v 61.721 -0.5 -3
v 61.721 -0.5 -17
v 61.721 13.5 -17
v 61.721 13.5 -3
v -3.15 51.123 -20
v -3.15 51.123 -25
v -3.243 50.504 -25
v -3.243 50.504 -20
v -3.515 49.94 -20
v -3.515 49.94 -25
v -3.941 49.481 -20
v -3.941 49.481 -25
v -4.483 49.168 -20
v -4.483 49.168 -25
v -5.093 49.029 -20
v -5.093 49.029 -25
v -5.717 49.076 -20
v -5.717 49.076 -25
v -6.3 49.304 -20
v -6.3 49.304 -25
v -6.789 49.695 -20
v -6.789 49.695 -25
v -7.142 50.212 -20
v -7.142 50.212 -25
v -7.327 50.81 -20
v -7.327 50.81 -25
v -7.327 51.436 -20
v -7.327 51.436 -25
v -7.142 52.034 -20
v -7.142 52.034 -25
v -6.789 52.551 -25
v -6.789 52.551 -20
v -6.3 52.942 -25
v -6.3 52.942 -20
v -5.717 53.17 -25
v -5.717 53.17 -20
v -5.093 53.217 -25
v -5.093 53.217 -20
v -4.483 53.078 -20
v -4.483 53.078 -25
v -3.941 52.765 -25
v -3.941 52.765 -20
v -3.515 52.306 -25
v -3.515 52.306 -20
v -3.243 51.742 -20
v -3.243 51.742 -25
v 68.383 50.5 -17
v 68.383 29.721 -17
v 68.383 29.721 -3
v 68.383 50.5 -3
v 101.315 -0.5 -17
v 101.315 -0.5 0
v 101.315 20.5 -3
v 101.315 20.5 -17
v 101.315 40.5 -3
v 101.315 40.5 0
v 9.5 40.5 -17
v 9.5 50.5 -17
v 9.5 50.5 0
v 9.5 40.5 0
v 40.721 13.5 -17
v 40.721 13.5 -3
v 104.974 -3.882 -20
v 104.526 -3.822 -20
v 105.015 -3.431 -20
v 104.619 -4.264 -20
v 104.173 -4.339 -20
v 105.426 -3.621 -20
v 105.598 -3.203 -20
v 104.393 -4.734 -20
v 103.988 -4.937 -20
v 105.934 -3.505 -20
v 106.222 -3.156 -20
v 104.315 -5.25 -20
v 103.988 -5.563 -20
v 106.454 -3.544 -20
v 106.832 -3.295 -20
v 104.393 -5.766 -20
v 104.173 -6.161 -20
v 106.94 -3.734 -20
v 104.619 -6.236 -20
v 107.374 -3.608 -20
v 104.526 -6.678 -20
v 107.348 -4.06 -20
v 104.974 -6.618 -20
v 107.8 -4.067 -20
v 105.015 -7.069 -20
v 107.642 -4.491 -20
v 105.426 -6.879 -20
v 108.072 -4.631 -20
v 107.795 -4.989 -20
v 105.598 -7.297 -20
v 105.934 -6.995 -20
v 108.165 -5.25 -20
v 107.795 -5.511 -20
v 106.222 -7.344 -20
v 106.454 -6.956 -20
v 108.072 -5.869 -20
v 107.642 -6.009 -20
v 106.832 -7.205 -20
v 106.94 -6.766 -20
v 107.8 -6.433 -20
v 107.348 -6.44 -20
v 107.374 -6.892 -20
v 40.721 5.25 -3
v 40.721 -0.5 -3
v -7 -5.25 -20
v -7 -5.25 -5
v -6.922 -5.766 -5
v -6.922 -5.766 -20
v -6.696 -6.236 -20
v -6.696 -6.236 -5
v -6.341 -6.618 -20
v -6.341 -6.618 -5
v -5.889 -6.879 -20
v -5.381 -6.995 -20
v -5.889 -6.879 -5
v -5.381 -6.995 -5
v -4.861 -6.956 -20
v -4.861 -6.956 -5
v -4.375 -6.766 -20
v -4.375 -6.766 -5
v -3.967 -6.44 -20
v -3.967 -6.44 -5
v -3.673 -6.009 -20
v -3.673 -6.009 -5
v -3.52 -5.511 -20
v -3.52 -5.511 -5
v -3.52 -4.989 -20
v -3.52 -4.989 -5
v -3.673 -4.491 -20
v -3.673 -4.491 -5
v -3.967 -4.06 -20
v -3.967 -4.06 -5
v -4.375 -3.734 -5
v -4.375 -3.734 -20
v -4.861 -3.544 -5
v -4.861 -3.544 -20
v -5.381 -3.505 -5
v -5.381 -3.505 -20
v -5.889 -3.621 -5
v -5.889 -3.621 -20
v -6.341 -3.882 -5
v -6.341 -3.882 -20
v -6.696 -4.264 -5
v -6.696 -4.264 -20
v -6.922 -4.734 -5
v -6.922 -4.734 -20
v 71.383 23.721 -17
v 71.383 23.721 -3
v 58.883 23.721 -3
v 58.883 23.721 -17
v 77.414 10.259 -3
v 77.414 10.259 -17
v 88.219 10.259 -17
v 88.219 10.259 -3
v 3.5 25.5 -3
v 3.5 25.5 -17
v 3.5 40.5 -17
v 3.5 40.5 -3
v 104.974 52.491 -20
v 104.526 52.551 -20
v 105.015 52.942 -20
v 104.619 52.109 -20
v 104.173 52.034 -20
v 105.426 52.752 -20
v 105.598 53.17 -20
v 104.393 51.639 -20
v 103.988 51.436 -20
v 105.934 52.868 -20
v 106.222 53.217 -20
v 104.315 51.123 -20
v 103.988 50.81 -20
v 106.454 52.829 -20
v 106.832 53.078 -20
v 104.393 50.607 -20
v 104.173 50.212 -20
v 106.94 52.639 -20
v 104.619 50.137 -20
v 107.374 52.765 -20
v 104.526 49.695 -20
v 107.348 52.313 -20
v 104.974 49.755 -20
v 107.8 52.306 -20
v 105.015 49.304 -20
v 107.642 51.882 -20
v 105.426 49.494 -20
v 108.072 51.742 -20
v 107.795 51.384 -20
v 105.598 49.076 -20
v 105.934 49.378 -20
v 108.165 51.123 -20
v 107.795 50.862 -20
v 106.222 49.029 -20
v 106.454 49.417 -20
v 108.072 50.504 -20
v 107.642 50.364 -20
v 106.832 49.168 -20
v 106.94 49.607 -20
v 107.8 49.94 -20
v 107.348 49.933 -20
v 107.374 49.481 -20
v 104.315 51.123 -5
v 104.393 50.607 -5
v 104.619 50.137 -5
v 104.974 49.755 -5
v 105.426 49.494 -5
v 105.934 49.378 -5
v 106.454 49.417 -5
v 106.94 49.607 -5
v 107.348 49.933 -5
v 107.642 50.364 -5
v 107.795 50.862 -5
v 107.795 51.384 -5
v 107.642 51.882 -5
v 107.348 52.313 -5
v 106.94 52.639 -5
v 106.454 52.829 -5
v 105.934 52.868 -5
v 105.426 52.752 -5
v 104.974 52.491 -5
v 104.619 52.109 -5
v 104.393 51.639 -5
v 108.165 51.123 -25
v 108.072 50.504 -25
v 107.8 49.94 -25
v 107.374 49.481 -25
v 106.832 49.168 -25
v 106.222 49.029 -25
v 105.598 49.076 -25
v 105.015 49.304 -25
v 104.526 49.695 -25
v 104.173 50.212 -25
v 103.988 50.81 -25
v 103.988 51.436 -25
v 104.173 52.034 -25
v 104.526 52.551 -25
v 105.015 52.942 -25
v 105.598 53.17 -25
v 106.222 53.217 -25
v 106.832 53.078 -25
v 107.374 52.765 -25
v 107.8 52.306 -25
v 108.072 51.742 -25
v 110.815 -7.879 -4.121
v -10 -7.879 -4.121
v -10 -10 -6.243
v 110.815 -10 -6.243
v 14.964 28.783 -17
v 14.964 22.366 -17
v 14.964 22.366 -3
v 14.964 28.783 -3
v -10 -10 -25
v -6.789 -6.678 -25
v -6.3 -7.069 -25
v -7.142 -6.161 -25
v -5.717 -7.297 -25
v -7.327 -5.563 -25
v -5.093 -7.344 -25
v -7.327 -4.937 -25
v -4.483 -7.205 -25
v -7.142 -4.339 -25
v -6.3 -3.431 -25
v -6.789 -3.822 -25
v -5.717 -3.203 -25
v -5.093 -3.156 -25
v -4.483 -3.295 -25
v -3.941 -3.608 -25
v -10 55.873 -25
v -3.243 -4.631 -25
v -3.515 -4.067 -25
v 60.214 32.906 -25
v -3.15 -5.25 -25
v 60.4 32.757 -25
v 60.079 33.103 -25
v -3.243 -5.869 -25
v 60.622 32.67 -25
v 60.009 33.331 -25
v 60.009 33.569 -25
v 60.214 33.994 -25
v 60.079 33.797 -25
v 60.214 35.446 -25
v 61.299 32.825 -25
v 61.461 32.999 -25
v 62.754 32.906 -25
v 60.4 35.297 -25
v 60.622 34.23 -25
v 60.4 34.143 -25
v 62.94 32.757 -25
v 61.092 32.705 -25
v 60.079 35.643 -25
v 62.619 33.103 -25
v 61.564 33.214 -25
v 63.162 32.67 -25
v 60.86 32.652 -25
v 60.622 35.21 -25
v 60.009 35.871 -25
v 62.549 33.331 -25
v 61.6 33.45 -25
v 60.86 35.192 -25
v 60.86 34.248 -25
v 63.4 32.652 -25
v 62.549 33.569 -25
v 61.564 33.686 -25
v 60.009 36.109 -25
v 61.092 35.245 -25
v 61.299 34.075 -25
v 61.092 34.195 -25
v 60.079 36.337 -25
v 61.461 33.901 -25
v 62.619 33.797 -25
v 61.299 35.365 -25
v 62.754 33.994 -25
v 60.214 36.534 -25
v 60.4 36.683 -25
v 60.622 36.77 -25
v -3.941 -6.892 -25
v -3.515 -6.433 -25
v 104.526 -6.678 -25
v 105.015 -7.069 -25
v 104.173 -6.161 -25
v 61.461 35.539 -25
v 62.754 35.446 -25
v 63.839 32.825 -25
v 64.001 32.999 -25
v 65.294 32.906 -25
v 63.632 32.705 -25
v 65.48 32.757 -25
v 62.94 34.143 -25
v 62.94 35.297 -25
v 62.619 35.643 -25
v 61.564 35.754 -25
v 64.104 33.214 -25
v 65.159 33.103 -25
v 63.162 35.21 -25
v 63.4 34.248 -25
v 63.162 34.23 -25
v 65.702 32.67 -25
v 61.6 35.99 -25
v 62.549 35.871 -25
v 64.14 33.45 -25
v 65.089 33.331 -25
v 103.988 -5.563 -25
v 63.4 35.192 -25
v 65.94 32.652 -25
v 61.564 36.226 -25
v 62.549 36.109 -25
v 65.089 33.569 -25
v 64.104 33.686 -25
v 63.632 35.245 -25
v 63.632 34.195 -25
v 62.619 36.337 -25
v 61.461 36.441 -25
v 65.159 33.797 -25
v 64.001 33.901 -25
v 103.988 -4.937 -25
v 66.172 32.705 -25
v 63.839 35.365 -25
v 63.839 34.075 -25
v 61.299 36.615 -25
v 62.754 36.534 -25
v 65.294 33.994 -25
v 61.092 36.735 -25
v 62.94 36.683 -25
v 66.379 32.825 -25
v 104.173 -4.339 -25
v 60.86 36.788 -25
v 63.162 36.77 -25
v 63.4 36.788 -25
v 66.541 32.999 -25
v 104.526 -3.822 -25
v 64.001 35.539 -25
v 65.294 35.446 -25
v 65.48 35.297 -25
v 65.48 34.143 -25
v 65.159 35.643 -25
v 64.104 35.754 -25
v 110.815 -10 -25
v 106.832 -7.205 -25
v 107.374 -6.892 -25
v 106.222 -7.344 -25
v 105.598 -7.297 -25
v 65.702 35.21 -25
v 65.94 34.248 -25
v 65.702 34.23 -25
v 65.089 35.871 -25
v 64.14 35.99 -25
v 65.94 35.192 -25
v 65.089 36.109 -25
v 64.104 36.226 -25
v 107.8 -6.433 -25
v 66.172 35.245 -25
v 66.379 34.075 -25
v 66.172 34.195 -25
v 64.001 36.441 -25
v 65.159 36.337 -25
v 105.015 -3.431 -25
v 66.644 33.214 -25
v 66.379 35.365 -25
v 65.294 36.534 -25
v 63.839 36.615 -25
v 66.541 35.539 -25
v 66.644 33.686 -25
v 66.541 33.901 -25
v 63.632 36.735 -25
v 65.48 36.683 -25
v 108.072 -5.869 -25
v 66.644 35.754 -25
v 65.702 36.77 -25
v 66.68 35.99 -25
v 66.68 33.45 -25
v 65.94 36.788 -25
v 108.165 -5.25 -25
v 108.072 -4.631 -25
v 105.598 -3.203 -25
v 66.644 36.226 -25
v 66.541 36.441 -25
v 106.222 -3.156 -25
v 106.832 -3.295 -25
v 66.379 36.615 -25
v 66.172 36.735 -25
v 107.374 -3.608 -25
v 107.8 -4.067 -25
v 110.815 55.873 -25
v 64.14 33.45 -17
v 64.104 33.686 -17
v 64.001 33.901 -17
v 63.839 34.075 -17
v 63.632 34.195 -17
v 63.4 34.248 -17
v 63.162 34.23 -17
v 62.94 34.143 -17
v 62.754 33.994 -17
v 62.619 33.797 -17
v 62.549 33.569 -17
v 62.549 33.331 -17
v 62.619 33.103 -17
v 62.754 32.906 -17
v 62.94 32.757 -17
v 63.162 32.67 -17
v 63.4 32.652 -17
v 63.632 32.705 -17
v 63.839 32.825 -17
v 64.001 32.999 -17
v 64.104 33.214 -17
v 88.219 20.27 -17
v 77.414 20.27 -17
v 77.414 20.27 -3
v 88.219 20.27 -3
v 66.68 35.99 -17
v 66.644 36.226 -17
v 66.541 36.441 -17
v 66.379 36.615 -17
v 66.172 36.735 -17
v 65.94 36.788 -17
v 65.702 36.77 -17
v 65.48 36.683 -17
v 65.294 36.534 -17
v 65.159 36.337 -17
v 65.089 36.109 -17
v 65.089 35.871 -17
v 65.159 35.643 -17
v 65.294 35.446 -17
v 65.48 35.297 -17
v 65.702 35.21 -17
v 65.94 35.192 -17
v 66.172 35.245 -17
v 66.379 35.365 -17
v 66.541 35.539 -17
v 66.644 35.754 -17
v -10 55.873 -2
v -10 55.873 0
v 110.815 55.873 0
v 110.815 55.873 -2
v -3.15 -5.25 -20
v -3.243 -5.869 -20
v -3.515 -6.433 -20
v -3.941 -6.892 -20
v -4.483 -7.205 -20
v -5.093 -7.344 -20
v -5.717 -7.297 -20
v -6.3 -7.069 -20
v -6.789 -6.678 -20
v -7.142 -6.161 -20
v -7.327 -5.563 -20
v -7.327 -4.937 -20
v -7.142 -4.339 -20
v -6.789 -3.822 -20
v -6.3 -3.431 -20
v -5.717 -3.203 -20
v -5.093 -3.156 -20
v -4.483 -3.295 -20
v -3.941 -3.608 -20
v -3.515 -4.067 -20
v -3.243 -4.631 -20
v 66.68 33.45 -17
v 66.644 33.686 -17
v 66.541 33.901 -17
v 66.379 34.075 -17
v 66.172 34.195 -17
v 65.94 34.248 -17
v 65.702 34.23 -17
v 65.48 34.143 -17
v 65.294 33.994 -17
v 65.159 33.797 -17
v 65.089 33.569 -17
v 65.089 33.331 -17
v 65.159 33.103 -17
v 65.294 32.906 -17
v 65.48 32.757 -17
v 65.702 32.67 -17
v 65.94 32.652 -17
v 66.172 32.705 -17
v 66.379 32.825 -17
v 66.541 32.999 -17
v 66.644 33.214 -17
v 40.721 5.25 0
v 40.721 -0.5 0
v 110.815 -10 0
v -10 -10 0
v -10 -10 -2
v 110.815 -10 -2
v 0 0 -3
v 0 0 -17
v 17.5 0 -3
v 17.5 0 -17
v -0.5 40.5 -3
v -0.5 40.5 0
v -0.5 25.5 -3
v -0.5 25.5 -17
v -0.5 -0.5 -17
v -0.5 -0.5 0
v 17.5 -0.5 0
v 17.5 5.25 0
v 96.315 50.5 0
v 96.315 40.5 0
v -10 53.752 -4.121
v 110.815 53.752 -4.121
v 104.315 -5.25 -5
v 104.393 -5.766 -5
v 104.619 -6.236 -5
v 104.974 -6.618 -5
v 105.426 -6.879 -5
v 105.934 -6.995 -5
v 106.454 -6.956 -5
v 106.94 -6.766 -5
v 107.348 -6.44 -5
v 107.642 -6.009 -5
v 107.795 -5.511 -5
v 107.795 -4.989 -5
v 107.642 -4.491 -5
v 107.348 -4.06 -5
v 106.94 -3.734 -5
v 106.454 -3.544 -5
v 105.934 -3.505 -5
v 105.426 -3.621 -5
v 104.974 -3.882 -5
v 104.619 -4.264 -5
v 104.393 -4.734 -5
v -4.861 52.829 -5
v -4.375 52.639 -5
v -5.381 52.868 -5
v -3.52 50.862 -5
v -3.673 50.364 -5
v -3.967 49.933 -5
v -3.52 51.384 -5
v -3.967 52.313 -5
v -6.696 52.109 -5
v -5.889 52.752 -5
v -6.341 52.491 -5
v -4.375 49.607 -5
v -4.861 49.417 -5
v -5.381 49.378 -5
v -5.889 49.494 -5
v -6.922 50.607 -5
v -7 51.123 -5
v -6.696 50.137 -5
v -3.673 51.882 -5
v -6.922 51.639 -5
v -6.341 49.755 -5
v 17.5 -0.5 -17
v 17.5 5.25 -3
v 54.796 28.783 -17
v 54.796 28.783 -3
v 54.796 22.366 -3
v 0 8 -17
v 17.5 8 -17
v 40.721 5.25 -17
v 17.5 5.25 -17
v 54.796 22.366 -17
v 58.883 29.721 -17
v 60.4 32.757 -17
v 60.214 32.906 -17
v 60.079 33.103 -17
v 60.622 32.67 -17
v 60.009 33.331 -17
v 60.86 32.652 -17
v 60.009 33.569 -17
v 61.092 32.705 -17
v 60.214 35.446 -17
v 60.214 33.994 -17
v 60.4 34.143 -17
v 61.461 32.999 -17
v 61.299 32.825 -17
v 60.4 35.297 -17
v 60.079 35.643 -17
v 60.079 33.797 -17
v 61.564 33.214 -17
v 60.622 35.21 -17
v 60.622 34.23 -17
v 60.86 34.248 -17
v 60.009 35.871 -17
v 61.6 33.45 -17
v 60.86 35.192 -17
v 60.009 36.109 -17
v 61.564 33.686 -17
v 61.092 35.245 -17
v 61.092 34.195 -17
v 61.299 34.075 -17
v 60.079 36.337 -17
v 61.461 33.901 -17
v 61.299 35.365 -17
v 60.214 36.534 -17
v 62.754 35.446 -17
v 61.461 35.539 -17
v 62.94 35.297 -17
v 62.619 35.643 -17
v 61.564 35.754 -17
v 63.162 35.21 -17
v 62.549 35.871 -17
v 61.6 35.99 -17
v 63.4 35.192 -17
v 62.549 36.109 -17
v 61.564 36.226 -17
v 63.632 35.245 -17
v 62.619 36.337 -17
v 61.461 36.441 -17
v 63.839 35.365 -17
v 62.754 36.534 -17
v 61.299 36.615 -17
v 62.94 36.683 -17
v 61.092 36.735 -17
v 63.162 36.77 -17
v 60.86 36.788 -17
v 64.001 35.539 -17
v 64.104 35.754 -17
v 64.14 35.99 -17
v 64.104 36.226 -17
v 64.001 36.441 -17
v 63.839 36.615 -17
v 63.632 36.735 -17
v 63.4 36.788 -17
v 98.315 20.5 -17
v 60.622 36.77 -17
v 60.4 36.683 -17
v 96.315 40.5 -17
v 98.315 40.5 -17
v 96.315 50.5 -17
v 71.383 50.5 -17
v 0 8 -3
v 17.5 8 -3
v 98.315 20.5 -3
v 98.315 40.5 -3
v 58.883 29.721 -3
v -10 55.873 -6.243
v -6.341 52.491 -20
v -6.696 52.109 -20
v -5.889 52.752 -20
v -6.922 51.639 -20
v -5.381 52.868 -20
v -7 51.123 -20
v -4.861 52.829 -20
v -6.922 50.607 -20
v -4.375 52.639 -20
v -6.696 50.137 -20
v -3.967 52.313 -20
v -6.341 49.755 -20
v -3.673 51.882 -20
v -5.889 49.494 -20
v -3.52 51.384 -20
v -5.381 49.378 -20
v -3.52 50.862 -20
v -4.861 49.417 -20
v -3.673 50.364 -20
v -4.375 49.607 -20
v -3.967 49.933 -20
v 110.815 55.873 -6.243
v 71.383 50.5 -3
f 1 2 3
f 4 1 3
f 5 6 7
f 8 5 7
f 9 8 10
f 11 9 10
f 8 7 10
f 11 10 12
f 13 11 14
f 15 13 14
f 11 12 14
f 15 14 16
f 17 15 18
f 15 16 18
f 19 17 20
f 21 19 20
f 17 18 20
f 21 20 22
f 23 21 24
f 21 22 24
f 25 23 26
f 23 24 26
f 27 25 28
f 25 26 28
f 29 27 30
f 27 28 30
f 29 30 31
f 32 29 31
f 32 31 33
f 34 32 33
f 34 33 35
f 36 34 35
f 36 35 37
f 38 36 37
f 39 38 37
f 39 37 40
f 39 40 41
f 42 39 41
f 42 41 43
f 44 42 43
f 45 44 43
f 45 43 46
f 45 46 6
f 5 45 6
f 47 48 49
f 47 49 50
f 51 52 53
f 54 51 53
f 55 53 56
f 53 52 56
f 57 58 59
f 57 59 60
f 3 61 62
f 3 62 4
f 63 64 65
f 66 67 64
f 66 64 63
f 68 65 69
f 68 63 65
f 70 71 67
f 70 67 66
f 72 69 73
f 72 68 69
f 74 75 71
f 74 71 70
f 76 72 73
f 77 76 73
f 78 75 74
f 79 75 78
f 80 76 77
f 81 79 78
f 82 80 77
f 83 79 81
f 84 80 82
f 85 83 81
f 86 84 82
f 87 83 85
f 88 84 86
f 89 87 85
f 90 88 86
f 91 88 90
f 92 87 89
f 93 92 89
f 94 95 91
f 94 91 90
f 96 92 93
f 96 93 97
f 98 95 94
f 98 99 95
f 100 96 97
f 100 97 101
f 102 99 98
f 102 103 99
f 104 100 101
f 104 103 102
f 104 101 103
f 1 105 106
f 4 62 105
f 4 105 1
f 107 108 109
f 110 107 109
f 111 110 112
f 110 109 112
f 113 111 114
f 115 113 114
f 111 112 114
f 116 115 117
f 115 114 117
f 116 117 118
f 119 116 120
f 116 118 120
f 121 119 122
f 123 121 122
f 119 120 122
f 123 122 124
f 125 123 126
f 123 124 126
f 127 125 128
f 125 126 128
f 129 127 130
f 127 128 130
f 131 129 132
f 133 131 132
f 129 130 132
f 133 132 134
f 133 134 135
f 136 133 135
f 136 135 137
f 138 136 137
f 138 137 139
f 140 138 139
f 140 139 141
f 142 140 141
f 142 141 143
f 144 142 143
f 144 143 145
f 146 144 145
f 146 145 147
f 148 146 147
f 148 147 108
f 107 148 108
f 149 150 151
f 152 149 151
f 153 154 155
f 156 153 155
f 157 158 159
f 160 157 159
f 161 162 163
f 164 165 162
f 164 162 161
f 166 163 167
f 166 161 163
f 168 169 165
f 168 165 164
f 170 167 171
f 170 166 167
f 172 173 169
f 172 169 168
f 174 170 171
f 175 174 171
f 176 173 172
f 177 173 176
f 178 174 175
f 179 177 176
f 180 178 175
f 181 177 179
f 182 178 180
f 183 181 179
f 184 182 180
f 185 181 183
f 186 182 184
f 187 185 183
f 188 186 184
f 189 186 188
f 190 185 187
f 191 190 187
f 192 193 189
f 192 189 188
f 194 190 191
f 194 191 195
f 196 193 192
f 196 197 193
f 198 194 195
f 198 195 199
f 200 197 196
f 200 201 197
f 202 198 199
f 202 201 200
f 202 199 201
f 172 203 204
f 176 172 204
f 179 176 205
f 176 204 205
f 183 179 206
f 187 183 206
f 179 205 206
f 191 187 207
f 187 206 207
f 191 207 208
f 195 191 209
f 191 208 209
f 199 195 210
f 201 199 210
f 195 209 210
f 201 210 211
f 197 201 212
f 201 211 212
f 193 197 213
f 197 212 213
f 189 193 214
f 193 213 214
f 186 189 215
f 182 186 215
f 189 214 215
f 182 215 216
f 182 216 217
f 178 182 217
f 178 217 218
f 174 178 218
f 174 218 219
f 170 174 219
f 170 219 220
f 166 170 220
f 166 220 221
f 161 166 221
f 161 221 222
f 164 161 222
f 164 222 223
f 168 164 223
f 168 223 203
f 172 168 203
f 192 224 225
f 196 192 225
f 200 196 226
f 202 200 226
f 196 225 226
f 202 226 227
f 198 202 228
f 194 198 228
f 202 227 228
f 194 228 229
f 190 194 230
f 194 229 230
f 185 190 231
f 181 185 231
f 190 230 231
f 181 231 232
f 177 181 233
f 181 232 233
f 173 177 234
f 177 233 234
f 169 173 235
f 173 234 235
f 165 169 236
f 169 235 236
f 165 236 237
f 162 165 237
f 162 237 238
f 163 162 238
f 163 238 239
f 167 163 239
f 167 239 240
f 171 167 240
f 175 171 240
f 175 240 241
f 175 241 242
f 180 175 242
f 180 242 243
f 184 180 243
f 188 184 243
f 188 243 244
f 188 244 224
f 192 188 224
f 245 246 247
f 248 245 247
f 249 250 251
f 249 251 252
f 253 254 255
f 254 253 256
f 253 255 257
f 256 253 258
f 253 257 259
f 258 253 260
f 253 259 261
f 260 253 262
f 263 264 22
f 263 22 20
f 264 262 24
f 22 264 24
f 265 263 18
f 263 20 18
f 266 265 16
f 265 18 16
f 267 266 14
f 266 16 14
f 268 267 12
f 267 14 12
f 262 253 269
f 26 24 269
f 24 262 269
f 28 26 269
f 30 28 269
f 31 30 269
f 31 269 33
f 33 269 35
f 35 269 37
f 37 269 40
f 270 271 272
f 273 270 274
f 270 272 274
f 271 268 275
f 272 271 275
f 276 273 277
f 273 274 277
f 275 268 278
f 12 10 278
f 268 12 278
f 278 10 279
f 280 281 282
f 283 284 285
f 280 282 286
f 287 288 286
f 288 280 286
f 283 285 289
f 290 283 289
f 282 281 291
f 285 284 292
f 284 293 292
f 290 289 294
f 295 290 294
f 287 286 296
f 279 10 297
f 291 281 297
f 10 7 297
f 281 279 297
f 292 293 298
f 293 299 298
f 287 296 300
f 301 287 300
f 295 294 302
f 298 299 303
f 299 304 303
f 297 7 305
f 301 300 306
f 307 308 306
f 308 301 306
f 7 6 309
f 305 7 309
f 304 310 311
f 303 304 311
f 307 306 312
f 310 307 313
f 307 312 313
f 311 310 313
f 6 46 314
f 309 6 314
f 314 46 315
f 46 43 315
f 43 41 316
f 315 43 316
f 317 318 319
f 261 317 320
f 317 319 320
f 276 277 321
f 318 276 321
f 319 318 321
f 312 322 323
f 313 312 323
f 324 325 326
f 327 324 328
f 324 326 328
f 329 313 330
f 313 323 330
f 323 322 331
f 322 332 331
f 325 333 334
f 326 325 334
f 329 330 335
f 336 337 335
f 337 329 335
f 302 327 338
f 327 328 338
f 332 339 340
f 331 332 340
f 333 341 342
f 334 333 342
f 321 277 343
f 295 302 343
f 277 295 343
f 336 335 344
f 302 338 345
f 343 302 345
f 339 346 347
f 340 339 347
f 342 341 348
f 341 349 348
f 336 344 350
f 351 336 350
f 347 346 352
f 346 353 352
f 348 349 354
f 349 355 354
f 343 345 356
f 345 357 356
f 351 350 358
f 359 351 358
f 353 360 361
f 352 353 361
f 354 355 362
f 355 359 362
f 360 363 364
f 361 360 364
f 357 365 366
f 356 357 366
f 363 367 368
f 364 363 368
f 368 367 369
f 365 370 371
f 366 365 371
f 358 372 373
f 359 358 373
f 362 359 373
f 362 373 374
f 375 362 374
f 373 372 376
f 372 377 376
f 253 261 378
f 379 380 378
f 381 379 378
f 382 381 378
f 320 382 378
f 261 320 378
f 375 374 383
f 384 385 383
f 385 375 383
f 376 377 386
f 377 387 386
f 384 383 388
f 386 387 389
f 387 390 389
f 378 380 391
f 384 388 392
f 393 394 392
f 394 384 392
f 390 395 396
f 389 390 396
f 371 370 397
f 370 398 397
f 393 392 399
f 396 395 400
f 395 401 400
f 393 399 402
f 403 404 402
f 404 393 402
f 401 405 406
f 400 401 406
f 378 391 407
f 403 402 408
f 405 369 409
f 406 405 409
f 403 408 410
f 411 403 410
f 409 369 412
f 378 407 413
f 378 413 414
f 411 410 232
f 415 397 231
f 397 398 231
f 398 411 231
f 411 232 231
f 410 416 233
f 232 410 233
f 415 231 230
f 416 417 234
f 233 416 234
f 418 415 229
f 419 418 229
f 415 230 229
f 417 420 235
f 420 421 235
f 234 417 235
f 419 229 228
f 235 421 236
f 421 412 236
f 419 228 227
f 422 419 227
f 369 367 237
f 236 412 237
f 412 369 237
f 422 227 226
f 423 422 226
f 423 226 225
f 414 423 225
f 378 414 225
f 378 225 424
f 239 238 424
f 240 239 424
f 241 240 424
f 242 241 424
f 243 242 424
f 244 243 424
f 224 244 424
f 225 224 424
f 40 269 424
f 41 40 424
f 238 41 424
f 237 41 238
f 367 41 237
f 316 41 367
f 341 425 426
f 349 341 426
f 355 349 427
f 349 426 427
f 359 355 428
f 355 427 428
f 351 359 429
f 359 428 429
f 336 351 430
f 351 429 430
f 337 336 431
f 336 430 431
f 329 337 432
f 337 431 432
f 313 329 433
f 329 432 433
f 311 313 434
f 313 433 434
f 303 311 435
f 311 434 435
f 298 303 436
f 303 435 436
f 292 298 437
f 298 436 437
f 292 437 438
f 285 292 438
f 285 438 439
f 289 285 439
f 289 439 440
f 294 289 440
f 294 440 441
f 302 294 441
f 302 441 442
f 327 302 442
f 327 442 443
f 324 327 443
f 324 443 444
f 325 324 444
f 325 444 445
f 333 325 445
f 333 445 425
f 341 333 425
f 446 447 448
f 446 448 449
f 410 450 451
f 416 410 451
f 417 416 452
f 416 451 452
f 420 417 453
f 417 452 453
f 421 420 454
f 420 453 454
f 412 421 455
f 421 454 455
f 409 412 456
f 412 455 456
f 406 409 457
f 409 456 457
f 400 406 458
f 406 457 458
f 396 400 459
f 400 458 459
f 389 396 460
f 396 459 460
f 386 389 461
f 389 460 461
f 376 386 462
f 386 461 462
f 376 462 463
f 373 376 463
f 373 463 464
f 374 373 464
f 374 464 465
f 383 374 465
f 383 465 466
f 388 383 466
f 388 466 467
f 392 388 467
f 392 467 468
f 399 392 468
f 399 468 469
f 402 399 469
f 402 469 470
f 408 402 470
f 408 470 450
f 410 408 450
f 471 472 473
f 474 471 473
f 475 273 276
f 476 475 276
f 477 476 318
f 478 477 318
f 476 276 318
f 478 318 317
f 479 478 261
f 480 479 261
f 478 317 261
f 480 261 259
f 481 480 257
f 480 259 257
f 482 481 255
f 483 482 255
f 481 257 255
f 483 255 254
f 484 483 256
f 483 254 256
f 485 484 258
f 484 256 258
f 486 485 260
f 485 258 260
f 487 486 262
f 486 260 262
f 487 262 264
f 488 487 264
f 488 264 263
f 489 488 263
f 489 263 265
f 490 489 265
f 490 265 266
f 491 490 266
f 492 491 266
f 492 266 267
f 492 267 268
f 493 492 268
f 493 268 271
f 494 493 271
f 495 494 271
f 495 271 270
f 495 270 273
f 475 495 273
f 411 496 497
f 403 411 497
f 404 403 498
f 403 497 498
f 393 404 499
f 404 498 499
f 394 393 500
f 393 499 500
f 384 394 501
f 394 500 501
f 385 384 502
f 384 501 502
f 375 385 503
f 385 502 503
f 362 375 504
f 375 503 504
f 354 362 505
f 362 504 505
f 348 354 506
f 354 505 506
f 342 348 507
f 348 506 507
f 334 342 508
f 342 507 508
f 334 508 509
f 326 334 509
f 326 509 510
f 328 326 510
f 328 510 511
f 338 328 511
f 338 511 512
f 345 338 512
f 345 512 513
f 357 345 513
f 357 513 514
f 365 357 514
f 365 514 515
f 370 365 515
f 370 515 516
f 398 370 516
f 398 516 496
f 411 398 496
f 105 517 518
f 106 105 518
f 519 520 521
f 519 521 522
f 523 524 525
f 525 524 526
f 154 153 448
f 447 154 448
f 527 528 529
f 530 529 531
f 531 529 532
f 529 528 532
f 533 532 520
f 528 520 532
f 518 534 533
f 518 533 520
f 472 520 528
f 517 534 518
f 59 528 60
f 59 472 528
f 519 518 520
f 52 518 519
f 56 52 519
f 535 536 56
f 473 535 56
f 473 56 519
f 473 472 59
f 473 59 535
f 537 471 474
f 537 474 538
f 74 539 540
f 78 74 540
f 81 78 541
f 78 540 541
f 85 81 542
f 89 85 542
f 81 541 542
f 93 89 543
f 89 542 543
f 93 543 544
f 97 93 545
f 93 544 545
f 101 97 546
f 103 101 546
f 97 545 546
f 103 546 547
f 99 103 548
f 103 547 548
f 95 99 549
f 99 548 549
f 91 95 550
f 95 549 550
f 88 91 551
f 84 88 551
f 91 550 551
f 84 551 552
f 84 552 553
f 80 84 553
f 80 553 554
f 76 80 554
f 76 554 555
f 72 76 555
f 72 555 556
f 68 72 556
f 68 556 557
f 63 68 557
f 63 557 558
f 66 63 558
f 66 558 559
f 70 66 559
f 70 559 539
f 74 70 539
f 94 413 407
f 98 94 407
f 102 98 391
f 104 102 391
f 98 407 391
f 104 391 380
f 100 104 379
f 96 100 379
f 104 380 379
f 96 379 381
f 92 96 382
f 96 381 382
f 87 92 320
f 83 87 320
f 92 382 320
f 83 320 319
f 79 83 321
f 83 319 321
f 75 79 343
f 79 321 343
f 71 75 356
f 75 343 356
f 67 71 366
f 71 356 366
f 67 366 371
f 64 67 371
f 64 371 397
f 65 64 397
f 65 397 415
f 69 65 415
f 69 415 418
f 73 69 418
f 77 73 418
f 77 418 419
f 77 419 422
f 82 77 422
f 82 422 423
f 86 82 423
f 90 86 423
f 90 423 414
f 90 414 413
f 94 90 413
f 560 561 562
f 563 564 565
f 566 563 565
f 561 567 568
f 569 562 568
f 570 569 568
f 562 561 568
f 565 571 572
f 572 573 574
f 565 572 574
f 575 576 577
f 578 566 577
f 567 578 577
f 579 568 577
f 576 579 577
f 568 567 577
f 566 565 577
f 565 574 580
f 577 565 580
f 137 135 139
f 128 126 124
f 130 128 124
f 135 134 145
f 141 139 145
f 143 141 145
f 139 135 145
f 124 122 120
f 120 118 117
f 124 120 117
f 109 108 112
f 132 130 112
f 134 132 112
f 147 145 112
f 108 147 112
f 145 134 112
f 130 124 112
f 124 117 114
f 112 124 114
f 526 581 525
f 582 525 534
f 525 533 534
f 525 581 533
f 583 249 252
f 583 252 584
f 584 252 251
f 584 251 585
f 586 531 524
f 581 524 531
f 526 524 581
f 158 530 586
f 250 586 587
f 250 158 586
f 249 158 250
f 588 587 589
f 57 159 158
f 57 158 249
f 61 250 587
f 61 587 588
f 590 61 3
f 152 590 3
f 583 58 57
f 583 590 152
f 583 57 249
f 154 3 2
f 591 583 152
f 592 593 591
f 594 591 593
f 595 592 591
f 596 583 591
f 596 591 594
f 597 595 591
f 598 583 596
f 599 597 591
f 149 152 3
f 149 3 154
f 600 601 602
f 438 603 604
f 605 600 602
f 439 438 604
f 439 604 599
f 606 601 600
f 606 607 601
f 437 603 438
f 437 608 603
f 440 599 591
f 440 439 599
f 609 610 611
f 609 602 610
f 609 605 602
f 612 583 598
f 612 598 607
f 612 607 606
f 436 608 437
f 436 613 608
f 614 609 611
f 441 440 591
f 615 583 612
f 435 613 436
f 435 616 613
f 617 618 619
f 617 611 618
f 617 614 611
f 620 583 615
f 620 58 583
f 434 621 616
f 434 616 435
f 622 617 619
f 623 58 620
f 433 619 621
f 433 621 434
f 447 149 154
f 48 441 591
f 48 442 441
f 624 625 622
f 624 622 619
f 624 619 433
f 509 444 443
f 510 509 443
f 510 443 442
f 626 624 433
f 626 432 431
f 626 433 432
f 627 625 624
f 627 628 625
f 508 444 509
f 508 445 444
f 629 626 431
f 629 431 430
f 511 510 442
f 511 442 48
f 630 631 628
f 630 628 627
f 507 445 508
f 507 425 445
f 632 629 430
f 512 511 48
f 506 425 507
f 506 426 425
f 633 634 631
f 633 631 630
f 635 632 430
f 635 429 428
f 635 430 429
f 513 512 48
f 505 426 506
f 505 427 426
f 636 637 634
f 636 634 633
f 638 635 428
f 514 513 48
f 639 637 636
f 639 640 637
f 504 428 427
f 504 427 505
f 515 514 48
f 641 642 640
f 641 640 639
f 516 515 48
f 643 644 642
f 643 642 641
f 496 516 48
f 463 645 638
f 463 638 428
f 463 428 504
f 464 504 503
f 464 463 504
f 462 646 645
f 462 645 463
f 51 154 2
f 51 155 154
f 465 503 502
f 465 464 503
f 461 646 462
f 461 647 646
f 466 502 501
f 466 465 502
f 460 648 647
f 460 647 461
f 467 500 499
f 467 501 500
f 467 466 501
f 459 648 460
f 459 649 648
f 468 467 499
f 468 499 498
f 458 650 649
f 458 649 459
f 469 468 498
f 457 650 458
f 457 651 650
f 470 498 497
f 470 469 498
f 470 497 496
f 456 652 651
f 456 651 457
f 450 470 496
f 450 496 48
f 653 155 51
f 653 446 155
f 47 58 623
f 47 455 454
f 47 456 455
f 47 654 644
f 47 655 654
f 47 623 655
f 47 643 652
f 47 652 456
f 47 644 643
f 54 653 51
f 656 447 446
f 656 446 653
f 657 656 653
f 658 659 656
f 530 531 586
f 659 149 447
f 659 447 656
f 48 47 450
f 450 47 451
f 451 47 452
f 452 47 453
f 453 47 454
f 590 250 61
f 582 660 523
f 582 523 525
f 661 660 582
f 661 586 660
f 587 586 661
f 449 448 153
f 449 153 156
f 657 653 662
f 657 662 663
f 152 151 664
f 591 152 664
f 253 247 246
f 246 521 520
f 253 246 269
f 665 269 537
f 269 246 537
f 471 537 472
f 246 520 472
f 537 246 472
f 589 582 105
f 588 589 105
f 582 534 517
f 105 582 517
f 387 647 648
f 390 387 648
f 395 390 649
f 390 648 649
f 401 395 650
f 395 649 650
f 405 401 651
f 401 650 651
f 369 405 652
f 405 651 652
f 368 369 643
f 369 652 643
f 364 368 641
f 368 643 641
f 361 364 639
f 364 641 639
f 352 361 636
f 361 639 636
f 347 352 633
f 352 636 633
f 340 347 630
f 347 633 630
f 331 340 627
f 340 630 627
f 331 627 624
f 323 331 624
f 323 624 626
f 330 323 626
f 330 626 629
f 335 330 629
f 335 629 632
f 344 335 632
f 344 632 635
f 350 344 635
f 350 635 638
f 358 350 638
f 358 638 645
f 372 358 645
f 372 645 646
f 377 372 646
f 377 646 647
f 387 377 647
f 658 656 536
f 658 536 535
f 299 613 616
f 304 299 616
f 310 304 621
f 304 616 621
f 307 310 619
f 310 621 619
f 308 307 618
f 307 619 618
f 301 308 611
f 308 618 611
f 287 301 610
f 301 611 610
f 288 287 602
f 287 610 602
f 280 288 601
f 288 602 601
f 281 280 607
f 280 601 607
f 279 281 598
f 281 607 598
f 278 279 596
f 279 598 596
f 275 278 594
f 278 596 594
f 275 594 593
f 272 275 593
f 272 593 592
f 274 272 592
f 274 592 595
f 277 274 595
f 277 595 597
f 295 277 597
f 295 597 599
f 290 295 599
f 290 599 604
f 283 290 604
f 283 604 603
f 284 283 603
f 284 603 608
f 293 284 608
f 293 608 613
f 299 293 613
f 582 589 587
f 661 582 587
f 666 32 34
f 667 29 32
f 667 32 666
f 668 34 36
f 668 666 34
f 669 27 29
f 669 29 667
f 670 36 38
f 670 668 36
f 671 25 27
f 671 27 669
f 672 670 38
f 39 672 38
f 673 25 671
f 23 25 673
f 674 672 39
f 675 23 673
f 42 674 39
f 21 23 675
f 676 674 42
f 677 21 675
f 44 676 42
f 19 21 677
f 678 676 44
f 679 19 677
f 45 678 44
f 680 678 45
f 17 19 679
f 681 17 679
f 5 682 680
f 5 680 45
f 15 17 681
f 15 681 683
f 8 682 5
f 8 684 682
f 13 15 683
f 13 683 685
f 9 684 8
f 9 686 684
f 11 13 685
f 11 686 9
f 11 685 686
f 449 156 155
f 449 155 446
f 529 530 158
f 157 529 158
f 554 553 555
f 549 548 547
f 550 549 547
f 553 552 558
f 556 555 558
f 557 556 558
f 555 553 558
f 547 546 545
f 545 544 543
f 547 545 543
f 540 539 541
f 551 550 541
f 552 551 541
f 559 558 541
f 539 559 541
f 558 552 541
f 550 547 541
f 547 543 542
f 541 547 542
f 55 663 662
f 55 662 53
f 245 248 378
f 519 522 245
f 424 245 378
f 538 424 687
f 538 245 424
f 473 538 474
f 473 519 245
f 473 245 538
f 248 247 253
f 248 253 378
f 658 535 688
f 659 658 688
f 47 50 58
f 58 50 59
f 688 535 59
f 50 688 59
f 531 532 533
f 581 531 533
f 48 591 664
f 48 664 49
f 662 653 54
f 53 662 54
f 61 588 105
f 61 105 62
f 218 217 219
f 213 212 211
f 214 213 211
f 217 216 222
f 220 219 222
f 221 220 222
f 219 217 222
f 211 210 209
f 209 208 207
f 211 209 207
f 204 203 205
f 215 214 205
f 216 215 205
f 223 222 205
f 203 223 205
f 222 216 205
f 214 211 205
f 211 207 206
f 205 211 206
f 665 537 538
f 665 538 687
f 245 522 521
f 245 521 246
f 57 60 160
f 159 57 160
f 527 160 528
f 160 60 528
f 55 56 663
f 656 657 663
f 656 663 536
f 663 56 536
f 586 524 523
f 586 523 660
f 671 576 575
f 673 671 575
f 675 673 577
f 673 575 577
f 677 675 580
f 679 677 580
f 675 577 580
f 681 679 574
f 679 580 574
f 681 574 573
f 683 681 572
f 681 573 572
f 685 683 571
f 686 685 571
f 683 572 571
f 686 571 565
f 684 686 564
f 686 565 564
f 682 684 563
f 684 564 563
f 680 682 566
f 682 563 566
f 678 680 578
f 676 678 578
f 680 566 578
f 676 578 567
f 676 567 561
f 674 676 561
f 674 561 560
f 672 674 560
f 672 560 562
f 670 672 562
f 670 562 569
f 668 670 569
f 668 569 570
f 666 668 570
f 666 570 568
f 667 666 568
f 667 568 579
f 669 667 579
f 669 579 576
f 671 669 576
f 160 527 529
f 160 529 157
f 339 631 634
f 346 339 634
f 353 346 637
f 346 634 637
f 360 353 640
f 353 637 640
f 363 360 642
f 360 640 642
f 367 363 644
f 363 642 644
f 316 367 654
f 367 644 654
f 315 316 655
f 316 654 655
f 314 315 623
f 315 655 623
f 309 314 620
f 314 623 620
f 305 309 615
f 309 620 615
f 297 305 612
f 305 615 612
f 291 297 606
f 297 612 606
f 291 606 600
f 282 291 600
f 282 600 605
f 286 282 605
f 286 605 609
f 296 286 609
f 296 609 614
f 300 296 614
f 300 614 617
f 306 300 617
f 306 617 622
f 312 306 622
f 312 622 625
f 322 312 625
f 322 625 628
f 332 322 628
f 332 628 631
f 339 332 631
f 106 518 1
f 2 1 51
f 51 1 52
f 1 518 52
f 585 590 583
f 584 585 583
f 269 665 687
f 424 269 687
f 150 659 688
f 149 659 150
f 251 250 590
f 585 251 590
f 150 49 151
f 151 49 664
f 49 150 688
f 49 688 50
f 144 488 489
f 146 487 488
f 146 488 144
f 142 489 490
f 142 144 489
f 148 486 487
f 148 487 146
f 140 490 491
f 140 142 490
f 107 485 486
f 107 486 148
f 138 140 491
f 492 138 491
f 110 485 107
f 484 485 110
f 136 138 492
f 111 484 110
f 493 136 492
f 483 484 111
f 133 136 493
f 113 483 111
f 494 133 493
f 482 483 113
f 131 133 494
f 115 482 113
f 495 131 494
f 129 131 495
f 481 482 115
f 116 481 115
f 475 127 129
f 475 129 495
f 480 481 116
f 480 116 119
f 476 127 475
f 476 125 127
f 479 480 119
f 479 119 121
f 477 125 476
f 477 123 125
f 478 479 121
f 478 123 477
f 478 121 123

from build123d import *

# Parameters (mm, degrees)
SKETCH_W            = 120.815
SKETCH_H            = 65.873
PAD_DEPTH           = 25
POCKET_DEPTH        = 17
SKETCH002_R         = 0.8
HOLE_DEPTH          = 8.001
SKETCH003_W         = 10.80455
SKETCH003_H         = 10.011545
SKETCH003_W_2       = 3
SKETCH003_H_2       = 20
SKETCH003_W_3       = 21
SKETCH003_H_3       = 14
SKETCH003_W_4       = 17.5
SKETCH003_H_4       = 8
SKETCH003_W_5       = 4
SKETCH003_H_5       = 15
SKETCH003_W_6       = 39.832252
SKETCH003_H_6       = 6.416744
PAD001_DEPTH        = 14
HOLE001_D           = 3.5
HOLE001_DEPTH       = 20
HOLE001_CBORE_D     = 4.2
HOLE001_CBORE_DEPTH = 5
POCKET001_DEPTH     = 120.816


with BuildPart() as part:
    # Sketch → Pad (new body)
    with BuildSketch(Plane.XY):
        with Locations((50.4075, 22.9365)):
            Rectangle(SKETCH_W, SKETCH_H)
    extrude(amount=-PAD_DEPTH)

    # Sketch001 (on Face5 of Pad) → Pocket (cut)
    with BuildSketch(Plane.XY):
        Polygon((-0.5, 40.5), (-0.5, -0.5), (17.5, -0.5), (17.5, 5.25), (40.721178, 5.25), (40.721178, -0.5), (101.315, -0.5), (101.315, 40.5), (96.315, 40.5), (96.315, 50.5), (9.5, 50.5), (9.5, 40.5), align=None)
    extrude(amount=-POCKET_DEPTH, mode=Mode.SUBTRACT)

    # Sketch002 (on Face19 of Pocket) → Hole (cut, through all)
    with BuildSketch(Plane.XY.offset(-17)):
        with Locations((60.8, 35.99)):
            Circle(SKETCH002_R)
        with Locations((63.34, 35.99)):
            Circle(SKETCH002_R)
        with Locations((65.88, 35.99)):
            Circle(SKETCH002_R)
        with Locations((65.88, 33.45)):
            Circle(SKETCH002_R)
        with Locations((63.34, 33.45)):
            Circle(SKETCH002_R)
        with Locations((60.8, 33.45)):
            Circle(SKETCH002_R)
    extrude(amount=-HOLE_DEPTH, mode=Mode.SUBTRACT)

    # Sketch003 (on Face25 of Hole) → Pad001 (join)
    with BuildSketch(Plane.XY.offset(-17)):
        with Locations((82.816269, 15.264502)):
            Rectangle(SKETCH003_W, SKETCH003_H)
        with Locations((99.815, 30.5)):
            Rectangle(SKETCH003_W_2, SKETCH003_H_2)
        with Locations((51.221178, 6.5)):
            Rectangle(SKETCH003_W_3, SKETCH003_H_3)
        with Locations((8.75, 4)):
            Rectangle(SKETCH003_W_4, SKETCH003_H_4)
        with Locations((1.5, 33)):
            Rectangle(SKETCH003_W_5, SKETCH003_H_5)
        Polygon((58.883009, 23.721054), (58.883009, 29.721054), (68.383009, 29.721054), (68.383009, 50.5), (71.383009, 50.5), (71.383009, 23.721054), align=None)
        with Locations((34.88002, 25.574335)):
            Rectangle(SKETCH003_W_6, SKETCH003_H_6)
    extrude(amount=PAD001_DEPTH)

    # Hole001
    with Locations(Plane(origin=(0, 0, -25), x_dir=(1, 0, 0), z_dir=(0, 0, -1))):
        with Locations((-5.25, 5.25), (106.065, 5.25), (-5.25, -51.123), (106.065, -51.123)):
            CounterBoreHole(HOLE001_D / 2, HOLE001_CBORE_D / 2, HOLE001_CBORE_DEPTH, depth=HOLE001_DEPTH)

    # Sketch005 (on Face2 of Hole001) → Pocket001 (cut, through all)
    with BuildSketch(Plane(origin=(-10, 0, 0), x_dir=(0, -1, 0), z_dir=(-1, 0, 0))):
        Polygon((-55.873, -2), (-53.75168, -4.12132), (-55.873, -6.242641), align=None)
        Polygon((10, -2), (7.87868, -4.12132), (10, -6.242641), align=None)
    extrude(amount=-POCKET001_DEPTH, mode=Mode.SUBTRACT)


solid = part.part
